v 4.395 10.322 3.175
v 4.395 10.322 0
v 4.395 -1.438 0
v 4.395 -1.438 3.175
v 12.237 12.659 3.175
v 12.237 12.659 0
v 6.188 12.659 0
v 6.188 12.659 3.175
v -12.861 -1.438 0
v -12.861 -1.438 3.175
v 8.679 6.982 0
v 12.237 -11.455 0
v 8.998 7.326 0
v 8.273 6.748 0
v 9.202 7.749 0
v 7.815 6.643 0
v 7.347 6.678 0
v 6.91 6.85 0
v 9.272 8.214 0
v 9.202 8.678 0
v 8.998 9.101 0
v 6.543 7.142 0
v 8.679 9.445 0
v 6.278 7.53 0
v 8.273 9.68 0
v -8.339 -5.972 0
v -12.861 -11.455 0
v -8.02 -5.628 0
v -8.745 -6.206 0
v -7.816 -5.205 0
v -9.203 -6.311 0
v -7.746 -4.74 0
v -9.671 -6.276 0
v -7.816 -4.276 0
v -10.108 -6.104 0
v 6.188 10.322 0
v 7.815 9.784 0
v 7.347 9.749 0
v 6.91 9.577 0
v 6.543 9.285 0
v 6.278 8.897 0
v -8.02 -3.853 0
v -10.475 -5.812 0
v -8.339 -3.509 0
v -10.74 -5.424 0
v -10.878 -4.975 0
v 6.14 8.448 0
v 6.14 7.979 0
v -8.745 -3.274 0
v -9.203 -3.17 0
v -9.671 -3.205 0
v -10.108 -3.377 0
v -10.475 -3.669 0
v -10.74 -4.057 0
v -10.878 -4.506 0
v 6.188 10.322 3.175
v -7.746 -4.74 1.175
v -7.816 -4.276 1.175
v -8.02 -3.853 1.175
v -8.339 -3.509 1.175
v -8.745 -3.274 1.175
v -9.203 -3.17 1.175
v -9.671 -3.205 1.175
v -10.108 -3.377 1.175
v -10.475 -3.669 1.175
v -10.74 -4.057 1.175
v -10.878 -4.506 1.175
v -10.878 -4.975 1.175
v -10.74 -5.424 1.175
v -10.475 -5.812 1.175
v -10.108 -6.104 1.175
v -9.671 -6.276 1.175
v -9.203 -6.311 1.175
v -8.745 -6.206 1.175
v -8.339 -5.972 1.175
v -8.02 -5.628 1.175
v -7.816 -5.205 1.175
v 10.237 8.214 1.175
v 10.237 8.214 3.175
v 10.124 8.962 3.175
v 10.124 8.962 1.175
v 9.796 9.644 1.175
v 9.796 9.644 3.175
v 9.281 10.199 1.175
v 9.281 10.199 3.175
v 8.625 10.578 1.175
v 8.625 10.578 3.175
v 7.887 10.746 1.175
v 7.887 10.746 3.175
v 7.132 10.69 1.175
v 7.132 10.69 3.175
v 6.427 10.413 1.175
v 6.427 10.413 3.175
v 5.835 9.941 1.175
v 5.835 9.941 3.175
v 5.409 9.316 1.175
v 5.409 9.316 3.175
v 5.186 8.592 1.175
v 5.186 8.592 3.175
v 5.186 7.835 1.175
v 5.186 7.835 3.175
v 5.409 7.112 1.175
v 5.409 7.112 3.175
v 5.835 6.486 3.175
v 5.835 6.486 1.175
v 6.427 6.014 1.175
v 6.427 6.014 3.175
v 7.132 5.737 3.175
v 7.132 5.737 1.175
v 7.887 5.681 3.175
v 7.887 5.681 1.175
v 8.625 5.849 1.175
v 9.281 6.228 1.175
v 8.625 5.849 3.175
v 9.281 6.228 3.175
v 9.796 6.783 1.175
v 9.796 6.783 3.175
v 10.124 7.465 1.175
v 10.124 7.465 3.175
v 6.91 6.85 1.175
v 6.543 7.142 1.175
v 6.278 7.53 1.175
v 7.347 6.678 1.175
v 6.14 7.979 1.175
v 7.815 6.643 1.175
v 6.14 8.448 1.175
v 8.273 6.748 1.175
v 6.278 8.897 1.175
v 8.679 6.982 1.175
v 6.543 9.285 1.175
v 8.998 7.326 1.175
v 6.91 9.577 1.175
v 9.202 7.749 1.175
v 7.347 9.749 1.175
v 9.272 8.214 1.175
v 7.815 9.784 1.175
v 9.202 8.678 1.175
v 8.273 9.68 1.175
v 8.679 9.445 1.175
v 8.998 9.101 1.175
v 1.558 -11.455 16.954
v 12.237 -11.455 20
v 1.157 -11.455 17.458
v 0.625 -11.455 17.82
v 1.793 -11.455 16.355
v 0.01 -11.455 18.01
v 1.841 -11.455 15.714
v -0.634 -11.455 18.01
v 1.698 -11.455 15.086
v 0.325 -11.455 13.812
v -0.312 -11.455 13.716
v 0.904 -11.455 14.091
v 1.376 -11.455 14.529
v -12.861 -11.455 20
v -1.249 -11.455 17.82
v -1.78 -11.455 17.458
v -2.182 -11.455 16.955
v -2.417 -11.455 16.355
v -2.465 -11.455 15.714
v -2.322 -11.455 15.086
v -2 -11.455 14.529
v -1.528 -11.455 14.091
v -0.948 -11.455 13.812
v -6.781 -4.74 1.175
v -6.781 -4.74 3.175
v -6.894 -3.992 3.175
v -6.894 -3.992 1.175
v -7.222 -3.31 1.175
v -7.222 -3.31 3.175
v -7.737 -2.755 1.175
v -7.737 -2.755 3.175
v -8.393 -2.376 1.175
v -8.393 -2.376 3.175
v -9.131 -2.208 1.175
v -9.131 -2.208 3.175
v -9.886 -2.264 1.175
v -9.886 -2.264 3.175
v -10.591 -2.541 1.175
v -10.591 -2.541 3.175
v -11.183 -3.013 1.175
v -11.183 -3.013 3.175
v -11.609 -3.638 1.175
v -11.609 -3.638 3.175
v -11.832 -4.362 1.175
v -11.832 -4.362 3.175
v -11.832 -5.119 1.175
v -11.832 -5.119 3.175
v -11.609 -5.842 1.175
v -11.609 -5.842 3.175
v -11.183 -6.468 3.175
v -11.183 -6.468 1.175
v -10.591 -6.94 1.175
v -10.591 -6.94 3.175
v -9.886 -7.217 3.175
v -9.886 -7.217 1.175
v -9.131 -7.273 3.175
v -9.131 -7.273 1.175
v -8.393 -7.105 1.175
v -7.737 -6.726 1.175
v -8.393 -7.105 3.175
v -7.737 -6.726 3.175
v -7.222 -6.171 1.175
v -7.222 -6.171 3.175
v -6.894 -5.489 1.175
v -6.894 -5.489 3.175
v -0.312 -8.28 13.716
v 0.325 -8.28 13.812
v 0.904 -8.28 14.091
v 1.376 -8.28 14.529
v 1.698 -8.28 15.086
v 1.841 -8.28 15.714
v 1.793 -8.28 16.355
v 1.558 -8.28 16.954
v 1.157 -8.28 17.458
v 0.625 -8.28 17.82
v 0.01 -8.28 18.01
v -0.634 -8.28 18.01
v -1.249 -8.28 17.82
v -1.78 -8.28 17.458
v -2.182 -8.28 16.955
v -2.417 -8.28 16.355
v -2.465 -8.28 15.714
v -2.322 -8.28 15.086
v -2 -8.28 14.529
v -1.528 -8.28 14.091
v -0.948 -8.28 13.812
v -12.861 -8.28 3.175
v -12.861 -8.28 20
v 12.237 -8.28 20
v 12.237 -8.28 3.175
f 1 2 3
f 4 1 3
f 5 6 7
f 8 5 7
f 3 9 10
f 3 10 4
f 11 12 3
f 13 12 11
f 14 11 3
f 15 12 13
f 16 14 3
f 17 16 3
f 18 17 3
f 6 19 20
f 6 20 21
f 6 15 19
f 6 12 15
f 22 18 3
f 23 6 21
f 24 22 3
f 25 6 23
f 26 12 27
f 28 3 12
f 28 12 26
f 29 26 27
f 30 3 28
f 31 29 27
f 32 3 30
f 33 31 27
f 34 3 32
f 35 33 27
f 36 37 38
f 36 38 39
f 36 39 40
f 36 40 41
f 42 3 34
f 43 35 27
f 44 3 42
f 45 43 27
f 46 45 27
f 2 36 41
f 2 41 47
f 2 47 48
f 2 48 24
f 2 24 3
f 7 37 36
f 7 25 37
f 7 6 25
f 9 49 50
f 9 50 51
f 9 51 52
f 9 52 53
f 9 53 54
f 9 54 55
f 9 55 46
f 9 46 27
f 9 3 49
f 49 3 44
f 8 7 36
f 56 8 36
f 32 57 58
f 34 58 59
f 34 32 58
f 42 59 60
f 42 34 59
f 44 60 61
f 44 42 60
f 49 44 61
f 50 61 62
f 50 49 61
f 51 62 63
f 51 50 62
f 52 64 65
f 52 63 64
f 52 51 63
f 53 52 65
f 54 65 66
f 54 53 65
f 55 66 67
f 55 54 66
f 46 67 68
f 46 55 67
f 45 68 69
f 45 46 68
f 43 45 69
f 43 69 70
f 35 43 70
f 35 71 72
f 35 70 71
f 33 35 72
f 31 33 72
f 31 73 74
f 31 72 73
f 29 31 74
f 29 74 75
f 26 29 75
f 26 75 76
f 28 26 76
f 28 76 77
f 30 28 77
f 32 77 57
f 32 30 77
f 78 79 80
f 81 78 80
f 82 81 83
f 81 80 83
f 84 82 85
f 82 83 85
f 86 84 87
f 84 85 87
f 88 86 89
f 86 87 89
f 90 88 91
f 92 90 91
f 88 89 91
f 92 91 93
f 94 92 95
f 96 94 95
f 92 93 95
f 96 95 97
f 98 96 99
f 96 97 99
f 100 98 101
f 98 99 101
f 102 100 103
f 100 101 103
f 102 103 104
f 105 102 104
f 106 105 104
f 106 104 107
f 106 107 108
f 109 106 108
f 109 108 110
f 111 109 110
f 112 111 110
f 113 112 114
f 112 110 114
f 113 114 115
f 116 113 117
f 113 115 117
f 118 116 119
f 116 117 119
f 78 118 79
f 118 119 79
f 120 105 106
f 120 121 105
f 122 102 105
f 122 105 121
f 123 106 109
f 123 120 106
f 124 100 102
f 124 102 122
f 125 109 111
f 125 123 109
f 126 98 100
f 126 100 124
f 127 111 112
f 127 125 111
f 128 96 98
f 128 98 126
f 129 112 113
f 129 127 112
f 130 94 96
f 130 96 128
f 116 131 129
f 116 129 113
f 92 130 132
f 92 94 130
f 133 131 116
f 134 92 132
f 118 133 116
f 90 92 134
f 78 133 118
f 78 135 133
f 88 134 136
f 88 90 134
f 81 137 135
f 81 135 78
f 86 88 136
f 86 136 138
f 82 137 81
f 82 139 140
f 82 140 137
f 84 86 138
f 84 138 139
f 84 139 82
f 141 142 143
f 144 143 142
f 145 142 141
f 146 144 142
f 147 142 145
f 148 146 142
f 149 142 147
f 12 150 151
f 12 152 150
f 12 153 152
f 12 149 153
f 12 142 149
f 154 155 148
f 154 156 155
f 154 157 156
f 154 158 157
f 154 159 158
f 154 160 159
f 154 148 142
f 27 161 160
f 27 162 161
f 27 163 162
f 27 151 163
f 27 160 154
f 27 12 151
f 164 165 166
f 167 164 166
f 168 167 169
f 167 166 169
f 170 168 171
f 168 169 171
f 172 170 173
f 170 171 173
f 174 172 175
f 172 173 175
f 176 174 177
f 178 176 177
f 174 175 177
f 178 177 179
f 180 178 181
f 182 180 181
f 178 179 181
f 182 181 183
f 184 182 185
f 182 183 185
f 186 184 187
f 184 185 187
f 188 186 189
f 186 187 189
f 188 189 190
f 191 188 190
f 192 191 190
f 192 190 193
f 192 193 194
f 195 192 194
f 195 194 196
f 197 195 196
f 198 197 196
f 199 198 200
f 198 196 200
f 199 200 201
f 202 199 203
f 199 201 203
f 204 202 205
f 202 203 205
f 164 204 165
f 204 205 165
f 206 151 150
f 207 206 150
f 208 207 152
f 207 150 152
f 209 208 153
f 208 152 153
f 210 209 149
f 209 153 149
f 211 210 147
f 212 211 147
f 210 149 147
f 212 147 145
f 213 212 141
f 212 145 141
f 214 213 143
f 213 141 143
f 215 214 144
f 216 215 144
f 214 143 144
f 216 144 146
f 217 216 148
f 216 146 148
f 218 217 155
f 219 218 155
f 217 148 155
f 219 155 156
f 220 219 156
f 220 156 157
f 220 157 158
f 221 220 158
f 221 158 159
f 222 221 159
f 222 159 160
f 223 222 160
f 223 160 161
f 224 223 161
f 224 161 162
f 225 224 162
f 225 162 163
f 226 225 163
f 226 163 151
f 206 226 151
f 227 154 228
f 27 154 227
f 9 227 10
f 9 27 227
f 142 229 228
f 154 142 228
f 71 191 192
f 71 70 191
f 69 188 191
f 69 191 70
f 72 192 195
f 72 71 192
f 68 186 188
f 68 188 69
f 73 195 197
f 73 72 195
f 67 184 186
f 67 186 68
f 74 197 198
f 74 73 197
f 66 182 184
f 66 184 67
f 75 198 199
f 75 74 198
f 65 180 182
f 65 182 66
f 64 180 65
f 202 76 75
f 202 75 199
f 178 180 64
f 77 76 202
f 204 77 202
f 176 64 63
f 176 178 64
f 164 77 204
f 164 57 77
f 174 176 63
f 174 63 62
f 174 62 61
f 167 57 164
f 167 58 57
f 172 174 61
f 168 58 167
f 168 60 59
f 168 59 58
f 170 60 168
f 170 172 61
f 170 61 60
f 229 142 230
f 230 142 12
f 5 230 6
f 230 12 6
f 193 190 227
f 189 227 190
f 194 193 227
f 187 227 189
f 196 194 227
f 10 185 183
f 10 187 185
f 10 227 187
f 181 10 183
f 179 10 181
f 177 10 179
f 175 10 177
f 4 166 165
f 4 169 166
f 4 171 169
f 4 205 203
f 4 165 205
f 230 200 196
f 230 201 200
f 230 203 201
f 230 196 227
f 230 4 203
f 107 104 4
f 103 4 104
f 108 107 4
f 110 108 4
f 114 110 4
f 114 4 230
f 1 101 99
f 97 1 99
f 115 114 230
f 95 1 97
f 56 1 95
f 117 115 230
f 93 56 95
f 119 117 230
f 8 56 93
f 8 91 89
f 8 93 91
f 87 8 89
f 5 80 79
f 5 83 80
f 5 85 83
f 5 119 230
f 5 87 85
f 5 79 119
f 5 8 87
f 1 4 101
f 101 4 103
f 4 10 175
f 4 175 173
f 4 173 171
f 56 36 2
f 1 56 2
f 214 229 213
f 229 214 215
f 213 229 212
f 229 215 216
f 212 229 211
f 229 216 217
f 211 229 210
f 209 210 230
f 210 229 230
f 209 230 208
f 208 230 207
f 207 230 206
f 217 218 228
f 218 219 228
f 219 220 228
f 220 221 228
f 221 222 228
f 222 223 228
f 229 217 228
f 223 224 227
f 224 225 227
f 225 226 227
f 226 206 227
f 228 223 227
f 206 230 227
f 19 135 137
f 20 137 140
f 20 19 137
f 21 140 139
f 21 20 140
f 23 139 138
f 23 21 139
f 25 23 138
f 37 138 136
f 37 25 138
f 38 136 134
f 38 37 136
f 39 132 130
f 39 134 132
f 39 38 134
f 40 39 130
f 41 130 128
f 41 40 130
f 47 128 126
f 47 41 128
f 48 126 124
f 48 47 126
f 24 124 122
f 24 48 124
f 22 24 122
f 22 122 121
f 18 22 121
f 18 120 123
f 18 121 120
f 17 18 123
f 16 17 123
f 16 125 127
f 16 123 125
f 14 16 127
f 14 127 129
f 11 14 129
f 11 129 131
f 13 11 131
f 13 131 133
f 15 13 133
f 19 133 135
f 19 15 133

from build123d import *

# Parameters (mm, degrees)
SKETCH2_R           = 1.5748
SKETCH2_W           = 1
SKETCH2_H           = 6.842
BOSS_EXTRUDE1_DEPTH = 3.175
SKETCH3_W           = 25.098
SKETCH3_H           = 3.175
BOSS_EXTRUDE3_DEPTH = 20
SKETCH4_R           = 2.159
CUT_EXTRUDE1_DEPTH  = 34.8656879
SKETCH5_R           = 2.54
CUT_EXTRUDE2_DEPTH  = 2


with BuildPart() as part:
    # Sketch2 → Boss-Extrude1 (new body)
    # profile 1 of 2: a face of its own
    with BuildSketch(Plane.XY):
        Polygon((4.395213829, 10.321811953), (4.395213829, 7.827388121), (4.395213829, -1.438404904), (-11.860786171, -1.438404904), (-11.860786171, -8.280404904), (12.237213829, -8.280404904), (12.237213829, 12.658595096), (7.697213829, 12.658595096), (6.188170382, 12.658595096), (6.188170382, 10.321811953), align=None)
        with Locations((-9.320786171, -4.740404904)):
            Circle(SKETCH2_R, mode=Mode.SUBTRACT)
        with Locations((7.697213829, 8.213595096)):
            Circle(SKETCH2_R, mode=Mode.SUBTRACT)
    # profile 2 of 2: a face of its own
    with BuildSketch(Plane.XY):
        with Locations((-12.360786171, -4.859404904)):
            Rectangle(SKETCH2_W, SKETCH2_H)
    extrude(amount=BOSS_EXTRUDE1_DEPTH)

    # Sketch3 → Boss-Extrude3 (add)
    with BuildSketch(Plane(origin=(0, 0, 0), x_dir=(-1, 0, 0), z_dir=(0, 0, -1))):
        with Locations((0.311786171, -9.867904904)):
            Rectangle(SKETCH3_W, SKETCH3_H)
    extrude(amount=-BOSS_EXTRUDE3_DEPTH)

    # Sketch4 → Cut-Extrude1 (cut, through all)
    with BuildSketch(Plane.XZ.offset(11.455404904)):
        with Locations(Location((-0.311786171, 15.875, 0), (0, 0, 270))):
            Circle(SKETCH4_R)
    extrude(amount=-CUT_EXTRUDE1_DEPTH, mode=Mode.SUBTRACT)

    # Sketch5 → Cut-Extrude2 (cut)
    with BuildSketch(Plane.XY.offset(3.175)):
        with Locations((7.697213829, 8.213595096)):
            Circle(SKETCH5_R)
        with Locations((-9.320786171, -4.740404904)):
            Circle(SKETCH5_R)
    extrude(amount=-CUT_EXTRUDE2_DEPTH, mode=Mode.SUBTRACT)


solid = part.part
